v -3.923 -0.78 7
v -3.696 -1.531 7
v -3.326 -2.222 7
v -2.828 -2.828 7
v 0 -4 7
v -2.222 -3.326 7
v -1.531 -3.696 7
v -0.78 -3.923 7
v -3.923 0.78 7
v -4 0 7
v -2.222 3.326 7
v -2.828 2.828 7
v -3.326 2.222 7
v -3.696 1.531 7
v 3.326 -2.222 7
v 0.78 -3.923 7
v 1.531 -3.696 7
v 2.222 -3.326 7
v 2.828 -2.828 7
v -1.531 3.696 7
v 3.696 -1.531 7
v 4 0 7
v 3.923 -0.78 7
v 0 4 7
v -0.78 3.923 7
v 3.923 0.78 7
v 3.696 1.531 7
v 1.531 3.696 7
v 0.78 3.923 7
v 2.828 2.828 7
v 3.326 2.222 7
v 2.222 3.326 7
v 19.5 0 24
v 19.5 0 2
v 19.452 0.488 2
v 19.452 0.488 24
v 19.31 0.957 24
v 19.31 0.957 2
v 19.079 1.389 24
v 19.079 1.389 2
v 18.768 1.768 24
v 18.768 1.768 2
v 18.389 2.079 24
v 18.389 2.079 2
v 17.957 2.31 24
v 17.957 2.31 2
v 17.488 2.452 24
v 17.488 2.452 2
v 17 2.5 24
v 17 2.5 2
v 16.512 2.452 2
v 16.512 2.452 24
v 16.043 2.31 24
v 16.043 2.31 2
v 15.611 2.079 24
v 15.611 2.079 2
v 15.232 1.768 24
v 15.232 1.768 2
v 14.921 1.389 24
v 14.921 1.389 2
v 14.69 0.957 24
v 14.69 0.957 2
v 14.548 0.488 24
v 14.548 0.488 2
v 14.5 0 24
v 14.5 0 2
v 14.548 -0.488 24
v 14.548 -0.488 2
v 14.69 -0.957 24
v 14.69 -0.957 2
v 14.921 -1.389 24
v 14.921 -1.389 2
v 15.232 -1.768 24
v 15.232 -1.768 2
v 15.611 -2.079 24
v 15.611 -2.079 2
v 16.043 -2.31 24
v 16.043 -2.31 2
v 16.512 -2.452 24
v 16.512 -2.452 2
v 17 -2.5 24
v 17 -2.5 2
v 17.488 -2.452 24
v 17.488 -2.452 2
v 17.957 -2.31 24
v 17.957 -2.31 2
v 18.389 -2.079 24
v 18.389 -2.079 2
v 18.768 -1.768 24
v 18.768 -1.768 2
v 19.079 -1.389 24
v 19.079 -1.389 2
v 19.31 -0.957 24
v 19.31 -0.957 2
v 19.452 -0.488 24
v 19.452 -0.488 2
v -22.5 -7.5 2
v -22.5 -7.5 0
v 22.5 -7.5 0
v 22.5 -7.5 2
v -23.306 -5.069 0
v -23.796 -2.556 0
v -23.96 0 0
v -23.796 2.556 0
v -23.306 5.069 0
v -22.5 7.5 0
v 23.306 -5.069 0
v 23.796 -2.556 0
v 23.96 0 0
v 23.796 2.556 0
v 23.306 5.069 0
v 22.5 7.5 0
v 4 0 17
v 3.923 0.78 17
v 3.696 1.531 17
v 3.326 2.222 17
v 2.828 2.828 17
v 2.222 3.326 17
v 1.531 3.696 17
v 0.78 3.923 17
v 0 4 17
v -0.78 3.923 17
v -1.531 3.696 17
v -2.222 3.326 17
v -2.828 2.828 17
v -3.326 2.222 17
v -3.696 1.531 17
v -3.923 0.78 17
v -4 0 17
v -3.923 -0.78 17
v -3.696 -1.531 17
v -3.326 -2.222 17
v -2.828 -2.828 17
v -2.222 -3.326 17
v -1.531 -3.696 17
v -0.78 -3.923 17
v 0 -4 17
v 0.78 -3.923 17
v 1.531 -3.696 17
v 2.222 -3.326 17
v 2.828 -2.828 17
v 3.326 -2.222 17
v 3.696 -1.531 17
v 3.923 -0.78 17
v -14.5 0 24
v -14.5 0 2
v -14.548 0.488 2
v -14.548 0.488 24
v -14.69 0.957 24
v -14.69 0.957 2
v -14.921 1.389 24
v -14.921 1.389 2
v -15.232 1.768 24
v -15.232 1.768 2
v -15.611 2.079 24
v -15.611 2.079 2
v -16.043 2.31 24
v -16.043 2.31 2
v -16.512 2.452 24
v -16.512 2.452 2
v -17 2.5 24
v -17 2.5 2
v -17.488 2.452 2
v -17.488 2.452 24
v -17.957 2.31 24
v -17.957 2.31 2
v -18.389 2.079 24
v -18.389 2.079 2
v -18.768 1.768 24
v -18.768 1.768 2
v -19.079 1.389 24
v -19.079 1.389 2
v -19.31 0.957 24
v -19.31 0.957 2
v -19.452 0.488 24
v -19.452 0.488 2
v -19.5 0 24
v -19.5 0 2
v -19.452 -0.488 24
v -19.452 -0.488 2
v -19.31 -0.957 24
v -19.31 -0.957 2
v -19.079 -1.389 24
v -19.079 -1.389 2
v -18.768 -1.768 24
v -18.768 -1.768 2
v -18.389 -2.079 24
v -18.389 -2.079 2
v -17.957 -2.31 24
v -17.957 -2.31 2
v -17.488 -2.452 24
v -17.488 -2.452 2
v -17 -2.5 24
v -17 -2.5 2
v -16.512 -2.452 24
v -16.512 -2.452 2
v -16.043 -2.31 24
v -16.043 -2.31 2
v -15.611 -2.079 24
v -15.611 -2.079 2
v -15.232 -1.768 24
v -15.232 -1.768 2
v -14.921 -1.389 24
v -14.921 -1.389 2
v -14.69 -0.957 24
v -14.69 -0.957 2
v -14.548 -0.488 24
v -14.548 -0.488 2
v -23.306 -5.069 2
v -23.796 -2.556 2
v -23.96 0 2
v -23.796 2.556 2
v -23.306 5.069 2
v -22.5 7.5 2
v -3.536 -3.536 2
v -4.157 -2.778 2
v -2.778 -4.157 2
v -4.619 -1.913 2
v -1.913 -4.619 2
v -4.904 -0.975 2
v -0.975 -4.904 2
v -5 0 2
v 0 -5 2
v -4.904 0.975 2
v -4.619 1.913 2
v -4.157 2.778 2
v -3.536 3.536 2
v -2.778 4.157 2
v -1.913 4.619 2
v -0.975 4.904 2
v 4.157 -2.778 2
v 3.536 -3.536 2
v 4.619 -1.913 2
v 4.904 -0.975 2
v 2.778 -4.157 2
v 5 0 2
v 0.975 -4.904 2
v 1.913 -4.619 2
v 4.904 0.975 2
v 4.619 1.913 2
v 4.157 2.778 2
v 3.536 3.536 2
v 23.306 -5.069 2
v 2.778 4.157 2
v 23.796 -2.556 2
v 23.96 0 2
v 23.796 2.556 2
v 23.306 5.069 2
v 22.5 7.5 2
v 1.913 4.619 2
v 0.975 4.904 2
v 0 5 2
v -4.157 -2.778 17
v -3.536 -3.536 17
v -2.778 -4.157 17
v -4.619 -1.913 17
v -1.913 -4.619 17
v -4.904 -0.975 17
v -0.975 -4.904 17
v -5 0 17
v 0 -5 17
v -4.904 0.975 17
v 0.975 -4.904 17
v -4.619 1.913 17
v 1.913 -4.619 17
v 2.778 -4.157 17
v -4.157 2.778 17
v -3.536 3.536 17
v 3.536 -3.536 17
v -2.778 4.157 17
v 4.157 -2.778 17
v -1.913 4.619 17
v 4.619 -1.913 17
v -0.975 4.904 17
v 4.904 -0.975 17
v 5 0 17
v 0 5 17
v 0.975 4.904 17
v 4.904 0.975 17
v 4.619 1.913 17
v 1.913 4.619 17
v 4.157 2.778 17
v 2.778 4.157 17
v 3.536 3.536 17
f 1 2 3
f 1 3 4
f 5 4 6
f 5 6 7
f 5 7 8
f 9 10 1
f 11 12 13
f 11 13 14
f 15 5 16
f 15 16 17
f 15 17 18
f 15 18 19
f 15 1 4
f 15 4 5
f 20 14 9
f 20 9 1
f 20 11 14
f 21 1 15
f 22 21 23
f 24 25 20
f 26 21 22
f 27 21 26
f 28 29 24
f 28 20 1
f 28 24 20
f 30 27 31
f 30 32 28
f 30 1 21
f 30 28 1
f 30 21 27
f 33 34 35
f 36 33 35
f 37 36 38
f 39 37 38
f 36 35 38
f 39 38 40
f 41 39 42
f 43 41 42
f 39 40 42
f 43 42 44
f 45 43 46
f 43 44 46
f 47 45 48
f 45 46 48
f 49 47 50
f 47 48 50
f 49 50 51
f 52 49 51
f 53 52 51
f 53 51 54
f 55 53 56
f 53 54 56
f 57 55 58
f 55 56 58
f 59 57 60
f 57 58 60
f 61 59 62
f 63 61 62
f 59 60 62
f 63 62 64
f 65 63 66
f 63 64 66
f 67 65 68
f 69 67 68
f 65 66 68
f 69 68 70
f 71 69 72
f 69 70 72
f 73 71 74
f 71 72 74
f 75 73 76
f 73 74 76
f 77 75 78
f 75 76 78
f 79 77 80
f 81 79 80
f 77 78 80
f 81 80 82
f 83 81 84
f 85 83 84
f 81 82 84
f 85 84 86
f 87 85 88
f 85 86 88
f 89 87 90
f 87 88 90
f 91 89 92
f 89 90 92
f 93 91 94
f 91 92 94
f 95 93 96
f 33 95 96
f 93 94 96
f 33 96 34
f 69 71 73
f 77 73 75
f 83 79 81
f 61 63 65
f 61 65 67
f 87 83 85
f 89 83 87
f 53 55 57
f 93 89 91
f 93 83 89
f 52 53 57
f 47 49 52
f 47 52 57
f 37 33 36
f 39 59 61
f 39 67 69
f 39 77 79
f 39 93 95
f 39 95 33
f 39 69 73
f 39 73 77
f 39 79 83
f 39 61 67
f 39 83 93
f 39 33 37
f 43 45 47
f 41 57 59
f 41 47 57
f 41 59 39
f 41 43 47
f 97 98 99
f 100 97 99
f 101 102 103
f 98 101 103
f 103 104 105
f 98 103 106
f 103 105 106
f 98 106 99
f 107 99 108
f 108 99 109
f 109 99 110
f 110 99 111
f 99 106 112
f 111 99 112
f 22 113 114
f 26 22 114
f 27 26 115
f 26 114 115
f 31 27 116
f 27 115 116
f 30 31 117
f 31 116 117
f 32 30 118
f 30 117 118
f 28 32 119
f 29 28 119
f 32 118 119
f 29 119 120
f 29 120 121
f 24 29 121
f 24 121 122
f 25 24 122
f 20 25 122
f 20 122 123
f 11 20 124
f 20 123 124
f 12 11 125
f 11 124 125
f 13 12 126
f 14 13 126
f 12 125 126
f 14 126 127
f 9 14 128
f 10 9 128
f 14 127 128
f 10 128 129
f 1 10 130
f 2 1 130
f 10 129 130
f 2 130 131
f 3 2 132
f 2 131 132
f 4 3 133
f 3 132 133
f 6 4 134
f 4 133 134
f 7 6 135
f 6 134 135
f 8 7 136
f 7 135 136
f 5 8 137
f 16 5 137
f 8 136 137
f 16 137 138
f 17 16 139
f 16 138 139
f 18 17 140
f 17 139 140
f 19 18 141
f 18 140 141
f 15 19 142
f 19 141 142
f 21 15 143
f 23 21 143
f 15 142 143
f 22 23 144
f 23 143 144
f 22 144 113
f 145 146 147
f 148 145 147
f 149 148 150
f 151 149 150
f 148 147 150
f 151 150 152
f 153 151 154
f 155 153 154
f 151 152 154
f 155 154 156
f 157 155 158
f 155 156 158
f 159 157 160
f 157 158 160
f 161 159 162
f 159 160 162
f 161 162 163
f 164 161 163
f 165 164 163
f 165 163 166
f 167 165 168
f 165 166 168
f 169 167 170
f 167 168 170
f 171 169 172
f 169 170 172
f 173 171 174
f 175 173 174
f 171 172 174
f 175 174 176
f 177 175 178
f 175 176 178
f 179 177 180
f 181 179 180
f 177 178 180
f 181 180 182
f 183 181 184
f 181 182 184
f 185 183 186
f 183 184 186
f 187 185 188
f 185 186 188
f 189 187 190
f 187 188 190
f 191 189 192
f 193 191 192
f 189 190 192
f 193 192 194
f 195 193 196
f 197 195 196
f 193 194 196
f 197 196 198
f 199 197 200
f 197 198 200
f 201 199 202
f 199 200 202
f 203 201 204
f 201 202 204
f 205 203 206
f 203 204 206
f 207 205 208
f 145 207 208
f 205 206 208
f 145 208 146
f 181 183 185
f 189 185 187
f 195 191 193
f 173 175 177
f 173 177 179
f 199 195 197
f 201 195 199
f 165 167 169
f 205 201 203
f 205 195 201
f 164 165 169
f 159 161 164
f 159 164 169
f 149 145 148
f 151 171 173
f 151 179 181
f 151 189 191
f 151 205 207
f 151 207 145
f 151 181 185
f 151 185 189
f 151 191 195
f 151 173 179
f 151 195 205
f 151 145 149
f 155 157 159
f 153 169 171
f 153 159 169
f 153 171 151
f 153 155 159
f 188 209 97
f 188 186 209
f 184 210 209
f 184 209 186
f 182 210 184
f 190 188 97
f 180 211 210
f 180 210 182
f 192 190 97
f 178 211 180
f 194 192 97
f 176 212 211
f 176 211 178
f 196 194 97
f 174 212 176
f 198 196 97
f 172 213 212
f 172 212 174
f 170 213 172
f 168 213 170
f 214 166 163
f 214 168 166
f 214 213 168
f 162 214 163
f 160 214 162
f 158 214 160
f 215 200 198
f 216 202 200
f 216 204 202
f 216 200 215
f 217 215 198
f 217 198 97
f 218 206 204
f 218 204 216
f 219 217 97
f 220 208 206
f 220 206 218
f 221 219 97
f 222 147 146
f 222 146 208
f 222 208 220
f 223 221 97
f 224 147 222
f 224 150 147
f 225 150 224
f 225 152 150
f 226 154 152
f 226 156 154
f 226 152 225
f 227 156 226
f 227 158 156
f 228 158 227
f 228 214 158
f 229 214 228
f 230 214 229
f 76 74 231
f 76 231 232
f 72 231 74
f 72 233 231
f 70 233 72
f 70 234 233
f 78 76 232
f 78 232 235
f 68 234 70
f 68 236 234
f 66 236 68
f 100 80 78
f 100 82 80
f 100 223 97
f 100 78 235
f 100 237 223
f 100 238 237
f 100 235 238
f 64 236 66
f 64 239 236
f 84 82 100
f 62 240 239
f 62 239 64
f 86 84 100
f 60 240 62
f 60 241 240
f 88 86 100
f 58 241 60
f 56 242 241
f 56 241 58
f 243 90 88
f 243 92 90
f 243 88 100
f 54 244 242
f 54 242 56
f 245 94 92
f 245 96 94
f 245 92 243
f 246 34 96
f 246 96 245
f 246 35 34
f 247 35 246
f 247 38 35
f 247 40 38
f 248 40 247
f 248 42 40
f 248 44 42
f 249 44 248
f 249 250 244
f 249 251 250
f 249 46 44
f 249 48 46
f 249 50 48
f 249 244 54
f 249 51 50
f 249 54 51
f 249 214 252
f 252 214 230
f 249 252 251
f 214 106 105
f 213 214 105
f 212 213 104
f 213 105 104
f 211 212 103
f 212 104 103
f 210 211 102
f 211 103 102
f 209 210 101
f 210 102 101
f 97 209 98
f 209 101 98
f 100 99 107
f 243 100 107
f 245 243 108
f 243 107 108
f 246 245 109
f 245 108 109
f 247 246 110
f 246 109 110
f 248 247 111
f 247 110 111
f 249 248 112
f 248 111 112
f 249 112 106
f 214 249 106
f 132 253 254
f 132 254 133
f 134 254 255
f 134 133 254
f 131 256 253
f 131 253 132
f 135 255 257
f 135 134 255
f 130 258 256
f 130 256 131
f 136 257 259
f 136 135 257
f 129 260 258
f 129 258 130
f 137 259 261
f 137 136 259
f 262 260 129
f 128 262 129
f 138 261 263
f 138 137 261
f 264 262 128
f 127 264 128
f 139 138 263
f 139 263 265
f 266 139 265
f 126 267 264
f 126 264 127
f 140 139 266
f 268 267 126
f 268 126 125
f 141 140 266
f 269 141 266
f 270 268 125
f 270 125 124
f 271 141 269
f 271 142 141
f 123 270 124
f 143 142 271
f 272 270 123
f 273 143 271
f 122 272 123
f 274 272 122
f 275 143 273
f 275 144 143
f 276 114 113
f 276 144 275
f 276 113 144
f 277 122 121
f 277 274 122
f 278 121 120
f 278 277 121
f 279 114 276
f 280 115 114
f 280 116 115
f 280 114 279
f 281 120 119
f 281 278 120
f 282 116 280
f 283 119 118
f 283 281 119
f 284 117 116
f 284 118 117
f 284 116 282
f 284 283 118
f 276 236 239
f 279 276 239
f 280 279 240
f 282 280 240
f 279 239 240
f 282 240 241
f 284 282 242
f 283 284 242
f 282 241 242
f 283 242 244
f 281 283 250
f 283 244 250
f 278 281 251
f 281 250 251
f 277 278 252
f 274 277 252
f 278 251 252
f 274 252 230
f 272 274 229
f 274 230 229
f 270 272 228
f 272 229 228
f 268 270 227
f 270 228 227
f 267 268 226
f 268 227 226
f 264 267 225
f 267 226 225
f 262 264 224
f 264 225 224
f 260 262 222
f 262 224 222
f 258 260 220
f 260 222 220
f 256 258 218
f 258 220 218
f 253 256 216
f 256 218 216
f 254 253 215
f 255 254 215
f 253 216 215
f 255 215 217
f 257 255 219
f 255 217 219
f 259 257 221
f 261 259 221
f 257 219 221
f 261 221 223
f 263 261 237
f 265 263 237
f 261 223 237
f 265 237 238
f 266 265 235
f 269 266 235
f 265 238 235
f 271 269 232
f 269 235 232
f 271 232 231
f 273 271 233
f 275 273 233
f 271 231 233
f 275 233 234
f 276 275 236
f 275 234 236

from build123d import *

# Parameters (mm, degrees)
BOSS_EXTRUDE1_DEPTH = 2
SKETCH2_R           = 5
BOSS_EXTRUDE2_DEPTH = 15
SKETCH4_R           = 4
CUT_EXTRUDE1_DEPTH  = 10
SKETCH5_R           = 2.5
BOSS_EXTRUDE3_DEPTH = 22


with BuildPart() as part:
    # Sketch1 → Boss-Extrude1 (new body)
    with BuildSketch(Plane.XY):
        with BuildLine():
            Line((-22.5, -7.5), (22.5, -7.5))
            ThreePointArc((22.5, -7.5), (23.959503782, 0), (22.5, 7.5))
            Line((22.5, 7.5), (-22.5, 7.5))
            ThreePointArc((-22.5, 7.5), (-23.959503782, 0), (-22.5, -7.5))
        make_face()
    extrude(amount=BOSS_EXTRUDE1_DEPTH)

    # Sketch2 → Boss-Extrude2 (add)
    with BuildSketch(Plane.XY.offset(2)):
        Circle(SKETCH2_R)
    extrude(amount=BOSS_EXTRUDE2_DEPTH)

    # Sketch4 → Cut-Extrude1 (cut)
    with BuildSketch(Plane.XY.offset(17)):
        Circle(SKETCH4_R)
    extrude(amount=-CUT_EXTRUDE1_DEPTH, mode=Mode.SUBTRACT)

    # Sketch5 → Boss-Extrude3 (add)
    with BuildSketch(Plane.XY.offset(2)):
        with Locations((-17, 0)):
            Circle(SKETCH5_R)
        with Locations((17, 0)):
            Circle(SKETCH5_R)
    extrude(amount=BOSS_EXTRUDE3_DEPTH)


solid = part.part
